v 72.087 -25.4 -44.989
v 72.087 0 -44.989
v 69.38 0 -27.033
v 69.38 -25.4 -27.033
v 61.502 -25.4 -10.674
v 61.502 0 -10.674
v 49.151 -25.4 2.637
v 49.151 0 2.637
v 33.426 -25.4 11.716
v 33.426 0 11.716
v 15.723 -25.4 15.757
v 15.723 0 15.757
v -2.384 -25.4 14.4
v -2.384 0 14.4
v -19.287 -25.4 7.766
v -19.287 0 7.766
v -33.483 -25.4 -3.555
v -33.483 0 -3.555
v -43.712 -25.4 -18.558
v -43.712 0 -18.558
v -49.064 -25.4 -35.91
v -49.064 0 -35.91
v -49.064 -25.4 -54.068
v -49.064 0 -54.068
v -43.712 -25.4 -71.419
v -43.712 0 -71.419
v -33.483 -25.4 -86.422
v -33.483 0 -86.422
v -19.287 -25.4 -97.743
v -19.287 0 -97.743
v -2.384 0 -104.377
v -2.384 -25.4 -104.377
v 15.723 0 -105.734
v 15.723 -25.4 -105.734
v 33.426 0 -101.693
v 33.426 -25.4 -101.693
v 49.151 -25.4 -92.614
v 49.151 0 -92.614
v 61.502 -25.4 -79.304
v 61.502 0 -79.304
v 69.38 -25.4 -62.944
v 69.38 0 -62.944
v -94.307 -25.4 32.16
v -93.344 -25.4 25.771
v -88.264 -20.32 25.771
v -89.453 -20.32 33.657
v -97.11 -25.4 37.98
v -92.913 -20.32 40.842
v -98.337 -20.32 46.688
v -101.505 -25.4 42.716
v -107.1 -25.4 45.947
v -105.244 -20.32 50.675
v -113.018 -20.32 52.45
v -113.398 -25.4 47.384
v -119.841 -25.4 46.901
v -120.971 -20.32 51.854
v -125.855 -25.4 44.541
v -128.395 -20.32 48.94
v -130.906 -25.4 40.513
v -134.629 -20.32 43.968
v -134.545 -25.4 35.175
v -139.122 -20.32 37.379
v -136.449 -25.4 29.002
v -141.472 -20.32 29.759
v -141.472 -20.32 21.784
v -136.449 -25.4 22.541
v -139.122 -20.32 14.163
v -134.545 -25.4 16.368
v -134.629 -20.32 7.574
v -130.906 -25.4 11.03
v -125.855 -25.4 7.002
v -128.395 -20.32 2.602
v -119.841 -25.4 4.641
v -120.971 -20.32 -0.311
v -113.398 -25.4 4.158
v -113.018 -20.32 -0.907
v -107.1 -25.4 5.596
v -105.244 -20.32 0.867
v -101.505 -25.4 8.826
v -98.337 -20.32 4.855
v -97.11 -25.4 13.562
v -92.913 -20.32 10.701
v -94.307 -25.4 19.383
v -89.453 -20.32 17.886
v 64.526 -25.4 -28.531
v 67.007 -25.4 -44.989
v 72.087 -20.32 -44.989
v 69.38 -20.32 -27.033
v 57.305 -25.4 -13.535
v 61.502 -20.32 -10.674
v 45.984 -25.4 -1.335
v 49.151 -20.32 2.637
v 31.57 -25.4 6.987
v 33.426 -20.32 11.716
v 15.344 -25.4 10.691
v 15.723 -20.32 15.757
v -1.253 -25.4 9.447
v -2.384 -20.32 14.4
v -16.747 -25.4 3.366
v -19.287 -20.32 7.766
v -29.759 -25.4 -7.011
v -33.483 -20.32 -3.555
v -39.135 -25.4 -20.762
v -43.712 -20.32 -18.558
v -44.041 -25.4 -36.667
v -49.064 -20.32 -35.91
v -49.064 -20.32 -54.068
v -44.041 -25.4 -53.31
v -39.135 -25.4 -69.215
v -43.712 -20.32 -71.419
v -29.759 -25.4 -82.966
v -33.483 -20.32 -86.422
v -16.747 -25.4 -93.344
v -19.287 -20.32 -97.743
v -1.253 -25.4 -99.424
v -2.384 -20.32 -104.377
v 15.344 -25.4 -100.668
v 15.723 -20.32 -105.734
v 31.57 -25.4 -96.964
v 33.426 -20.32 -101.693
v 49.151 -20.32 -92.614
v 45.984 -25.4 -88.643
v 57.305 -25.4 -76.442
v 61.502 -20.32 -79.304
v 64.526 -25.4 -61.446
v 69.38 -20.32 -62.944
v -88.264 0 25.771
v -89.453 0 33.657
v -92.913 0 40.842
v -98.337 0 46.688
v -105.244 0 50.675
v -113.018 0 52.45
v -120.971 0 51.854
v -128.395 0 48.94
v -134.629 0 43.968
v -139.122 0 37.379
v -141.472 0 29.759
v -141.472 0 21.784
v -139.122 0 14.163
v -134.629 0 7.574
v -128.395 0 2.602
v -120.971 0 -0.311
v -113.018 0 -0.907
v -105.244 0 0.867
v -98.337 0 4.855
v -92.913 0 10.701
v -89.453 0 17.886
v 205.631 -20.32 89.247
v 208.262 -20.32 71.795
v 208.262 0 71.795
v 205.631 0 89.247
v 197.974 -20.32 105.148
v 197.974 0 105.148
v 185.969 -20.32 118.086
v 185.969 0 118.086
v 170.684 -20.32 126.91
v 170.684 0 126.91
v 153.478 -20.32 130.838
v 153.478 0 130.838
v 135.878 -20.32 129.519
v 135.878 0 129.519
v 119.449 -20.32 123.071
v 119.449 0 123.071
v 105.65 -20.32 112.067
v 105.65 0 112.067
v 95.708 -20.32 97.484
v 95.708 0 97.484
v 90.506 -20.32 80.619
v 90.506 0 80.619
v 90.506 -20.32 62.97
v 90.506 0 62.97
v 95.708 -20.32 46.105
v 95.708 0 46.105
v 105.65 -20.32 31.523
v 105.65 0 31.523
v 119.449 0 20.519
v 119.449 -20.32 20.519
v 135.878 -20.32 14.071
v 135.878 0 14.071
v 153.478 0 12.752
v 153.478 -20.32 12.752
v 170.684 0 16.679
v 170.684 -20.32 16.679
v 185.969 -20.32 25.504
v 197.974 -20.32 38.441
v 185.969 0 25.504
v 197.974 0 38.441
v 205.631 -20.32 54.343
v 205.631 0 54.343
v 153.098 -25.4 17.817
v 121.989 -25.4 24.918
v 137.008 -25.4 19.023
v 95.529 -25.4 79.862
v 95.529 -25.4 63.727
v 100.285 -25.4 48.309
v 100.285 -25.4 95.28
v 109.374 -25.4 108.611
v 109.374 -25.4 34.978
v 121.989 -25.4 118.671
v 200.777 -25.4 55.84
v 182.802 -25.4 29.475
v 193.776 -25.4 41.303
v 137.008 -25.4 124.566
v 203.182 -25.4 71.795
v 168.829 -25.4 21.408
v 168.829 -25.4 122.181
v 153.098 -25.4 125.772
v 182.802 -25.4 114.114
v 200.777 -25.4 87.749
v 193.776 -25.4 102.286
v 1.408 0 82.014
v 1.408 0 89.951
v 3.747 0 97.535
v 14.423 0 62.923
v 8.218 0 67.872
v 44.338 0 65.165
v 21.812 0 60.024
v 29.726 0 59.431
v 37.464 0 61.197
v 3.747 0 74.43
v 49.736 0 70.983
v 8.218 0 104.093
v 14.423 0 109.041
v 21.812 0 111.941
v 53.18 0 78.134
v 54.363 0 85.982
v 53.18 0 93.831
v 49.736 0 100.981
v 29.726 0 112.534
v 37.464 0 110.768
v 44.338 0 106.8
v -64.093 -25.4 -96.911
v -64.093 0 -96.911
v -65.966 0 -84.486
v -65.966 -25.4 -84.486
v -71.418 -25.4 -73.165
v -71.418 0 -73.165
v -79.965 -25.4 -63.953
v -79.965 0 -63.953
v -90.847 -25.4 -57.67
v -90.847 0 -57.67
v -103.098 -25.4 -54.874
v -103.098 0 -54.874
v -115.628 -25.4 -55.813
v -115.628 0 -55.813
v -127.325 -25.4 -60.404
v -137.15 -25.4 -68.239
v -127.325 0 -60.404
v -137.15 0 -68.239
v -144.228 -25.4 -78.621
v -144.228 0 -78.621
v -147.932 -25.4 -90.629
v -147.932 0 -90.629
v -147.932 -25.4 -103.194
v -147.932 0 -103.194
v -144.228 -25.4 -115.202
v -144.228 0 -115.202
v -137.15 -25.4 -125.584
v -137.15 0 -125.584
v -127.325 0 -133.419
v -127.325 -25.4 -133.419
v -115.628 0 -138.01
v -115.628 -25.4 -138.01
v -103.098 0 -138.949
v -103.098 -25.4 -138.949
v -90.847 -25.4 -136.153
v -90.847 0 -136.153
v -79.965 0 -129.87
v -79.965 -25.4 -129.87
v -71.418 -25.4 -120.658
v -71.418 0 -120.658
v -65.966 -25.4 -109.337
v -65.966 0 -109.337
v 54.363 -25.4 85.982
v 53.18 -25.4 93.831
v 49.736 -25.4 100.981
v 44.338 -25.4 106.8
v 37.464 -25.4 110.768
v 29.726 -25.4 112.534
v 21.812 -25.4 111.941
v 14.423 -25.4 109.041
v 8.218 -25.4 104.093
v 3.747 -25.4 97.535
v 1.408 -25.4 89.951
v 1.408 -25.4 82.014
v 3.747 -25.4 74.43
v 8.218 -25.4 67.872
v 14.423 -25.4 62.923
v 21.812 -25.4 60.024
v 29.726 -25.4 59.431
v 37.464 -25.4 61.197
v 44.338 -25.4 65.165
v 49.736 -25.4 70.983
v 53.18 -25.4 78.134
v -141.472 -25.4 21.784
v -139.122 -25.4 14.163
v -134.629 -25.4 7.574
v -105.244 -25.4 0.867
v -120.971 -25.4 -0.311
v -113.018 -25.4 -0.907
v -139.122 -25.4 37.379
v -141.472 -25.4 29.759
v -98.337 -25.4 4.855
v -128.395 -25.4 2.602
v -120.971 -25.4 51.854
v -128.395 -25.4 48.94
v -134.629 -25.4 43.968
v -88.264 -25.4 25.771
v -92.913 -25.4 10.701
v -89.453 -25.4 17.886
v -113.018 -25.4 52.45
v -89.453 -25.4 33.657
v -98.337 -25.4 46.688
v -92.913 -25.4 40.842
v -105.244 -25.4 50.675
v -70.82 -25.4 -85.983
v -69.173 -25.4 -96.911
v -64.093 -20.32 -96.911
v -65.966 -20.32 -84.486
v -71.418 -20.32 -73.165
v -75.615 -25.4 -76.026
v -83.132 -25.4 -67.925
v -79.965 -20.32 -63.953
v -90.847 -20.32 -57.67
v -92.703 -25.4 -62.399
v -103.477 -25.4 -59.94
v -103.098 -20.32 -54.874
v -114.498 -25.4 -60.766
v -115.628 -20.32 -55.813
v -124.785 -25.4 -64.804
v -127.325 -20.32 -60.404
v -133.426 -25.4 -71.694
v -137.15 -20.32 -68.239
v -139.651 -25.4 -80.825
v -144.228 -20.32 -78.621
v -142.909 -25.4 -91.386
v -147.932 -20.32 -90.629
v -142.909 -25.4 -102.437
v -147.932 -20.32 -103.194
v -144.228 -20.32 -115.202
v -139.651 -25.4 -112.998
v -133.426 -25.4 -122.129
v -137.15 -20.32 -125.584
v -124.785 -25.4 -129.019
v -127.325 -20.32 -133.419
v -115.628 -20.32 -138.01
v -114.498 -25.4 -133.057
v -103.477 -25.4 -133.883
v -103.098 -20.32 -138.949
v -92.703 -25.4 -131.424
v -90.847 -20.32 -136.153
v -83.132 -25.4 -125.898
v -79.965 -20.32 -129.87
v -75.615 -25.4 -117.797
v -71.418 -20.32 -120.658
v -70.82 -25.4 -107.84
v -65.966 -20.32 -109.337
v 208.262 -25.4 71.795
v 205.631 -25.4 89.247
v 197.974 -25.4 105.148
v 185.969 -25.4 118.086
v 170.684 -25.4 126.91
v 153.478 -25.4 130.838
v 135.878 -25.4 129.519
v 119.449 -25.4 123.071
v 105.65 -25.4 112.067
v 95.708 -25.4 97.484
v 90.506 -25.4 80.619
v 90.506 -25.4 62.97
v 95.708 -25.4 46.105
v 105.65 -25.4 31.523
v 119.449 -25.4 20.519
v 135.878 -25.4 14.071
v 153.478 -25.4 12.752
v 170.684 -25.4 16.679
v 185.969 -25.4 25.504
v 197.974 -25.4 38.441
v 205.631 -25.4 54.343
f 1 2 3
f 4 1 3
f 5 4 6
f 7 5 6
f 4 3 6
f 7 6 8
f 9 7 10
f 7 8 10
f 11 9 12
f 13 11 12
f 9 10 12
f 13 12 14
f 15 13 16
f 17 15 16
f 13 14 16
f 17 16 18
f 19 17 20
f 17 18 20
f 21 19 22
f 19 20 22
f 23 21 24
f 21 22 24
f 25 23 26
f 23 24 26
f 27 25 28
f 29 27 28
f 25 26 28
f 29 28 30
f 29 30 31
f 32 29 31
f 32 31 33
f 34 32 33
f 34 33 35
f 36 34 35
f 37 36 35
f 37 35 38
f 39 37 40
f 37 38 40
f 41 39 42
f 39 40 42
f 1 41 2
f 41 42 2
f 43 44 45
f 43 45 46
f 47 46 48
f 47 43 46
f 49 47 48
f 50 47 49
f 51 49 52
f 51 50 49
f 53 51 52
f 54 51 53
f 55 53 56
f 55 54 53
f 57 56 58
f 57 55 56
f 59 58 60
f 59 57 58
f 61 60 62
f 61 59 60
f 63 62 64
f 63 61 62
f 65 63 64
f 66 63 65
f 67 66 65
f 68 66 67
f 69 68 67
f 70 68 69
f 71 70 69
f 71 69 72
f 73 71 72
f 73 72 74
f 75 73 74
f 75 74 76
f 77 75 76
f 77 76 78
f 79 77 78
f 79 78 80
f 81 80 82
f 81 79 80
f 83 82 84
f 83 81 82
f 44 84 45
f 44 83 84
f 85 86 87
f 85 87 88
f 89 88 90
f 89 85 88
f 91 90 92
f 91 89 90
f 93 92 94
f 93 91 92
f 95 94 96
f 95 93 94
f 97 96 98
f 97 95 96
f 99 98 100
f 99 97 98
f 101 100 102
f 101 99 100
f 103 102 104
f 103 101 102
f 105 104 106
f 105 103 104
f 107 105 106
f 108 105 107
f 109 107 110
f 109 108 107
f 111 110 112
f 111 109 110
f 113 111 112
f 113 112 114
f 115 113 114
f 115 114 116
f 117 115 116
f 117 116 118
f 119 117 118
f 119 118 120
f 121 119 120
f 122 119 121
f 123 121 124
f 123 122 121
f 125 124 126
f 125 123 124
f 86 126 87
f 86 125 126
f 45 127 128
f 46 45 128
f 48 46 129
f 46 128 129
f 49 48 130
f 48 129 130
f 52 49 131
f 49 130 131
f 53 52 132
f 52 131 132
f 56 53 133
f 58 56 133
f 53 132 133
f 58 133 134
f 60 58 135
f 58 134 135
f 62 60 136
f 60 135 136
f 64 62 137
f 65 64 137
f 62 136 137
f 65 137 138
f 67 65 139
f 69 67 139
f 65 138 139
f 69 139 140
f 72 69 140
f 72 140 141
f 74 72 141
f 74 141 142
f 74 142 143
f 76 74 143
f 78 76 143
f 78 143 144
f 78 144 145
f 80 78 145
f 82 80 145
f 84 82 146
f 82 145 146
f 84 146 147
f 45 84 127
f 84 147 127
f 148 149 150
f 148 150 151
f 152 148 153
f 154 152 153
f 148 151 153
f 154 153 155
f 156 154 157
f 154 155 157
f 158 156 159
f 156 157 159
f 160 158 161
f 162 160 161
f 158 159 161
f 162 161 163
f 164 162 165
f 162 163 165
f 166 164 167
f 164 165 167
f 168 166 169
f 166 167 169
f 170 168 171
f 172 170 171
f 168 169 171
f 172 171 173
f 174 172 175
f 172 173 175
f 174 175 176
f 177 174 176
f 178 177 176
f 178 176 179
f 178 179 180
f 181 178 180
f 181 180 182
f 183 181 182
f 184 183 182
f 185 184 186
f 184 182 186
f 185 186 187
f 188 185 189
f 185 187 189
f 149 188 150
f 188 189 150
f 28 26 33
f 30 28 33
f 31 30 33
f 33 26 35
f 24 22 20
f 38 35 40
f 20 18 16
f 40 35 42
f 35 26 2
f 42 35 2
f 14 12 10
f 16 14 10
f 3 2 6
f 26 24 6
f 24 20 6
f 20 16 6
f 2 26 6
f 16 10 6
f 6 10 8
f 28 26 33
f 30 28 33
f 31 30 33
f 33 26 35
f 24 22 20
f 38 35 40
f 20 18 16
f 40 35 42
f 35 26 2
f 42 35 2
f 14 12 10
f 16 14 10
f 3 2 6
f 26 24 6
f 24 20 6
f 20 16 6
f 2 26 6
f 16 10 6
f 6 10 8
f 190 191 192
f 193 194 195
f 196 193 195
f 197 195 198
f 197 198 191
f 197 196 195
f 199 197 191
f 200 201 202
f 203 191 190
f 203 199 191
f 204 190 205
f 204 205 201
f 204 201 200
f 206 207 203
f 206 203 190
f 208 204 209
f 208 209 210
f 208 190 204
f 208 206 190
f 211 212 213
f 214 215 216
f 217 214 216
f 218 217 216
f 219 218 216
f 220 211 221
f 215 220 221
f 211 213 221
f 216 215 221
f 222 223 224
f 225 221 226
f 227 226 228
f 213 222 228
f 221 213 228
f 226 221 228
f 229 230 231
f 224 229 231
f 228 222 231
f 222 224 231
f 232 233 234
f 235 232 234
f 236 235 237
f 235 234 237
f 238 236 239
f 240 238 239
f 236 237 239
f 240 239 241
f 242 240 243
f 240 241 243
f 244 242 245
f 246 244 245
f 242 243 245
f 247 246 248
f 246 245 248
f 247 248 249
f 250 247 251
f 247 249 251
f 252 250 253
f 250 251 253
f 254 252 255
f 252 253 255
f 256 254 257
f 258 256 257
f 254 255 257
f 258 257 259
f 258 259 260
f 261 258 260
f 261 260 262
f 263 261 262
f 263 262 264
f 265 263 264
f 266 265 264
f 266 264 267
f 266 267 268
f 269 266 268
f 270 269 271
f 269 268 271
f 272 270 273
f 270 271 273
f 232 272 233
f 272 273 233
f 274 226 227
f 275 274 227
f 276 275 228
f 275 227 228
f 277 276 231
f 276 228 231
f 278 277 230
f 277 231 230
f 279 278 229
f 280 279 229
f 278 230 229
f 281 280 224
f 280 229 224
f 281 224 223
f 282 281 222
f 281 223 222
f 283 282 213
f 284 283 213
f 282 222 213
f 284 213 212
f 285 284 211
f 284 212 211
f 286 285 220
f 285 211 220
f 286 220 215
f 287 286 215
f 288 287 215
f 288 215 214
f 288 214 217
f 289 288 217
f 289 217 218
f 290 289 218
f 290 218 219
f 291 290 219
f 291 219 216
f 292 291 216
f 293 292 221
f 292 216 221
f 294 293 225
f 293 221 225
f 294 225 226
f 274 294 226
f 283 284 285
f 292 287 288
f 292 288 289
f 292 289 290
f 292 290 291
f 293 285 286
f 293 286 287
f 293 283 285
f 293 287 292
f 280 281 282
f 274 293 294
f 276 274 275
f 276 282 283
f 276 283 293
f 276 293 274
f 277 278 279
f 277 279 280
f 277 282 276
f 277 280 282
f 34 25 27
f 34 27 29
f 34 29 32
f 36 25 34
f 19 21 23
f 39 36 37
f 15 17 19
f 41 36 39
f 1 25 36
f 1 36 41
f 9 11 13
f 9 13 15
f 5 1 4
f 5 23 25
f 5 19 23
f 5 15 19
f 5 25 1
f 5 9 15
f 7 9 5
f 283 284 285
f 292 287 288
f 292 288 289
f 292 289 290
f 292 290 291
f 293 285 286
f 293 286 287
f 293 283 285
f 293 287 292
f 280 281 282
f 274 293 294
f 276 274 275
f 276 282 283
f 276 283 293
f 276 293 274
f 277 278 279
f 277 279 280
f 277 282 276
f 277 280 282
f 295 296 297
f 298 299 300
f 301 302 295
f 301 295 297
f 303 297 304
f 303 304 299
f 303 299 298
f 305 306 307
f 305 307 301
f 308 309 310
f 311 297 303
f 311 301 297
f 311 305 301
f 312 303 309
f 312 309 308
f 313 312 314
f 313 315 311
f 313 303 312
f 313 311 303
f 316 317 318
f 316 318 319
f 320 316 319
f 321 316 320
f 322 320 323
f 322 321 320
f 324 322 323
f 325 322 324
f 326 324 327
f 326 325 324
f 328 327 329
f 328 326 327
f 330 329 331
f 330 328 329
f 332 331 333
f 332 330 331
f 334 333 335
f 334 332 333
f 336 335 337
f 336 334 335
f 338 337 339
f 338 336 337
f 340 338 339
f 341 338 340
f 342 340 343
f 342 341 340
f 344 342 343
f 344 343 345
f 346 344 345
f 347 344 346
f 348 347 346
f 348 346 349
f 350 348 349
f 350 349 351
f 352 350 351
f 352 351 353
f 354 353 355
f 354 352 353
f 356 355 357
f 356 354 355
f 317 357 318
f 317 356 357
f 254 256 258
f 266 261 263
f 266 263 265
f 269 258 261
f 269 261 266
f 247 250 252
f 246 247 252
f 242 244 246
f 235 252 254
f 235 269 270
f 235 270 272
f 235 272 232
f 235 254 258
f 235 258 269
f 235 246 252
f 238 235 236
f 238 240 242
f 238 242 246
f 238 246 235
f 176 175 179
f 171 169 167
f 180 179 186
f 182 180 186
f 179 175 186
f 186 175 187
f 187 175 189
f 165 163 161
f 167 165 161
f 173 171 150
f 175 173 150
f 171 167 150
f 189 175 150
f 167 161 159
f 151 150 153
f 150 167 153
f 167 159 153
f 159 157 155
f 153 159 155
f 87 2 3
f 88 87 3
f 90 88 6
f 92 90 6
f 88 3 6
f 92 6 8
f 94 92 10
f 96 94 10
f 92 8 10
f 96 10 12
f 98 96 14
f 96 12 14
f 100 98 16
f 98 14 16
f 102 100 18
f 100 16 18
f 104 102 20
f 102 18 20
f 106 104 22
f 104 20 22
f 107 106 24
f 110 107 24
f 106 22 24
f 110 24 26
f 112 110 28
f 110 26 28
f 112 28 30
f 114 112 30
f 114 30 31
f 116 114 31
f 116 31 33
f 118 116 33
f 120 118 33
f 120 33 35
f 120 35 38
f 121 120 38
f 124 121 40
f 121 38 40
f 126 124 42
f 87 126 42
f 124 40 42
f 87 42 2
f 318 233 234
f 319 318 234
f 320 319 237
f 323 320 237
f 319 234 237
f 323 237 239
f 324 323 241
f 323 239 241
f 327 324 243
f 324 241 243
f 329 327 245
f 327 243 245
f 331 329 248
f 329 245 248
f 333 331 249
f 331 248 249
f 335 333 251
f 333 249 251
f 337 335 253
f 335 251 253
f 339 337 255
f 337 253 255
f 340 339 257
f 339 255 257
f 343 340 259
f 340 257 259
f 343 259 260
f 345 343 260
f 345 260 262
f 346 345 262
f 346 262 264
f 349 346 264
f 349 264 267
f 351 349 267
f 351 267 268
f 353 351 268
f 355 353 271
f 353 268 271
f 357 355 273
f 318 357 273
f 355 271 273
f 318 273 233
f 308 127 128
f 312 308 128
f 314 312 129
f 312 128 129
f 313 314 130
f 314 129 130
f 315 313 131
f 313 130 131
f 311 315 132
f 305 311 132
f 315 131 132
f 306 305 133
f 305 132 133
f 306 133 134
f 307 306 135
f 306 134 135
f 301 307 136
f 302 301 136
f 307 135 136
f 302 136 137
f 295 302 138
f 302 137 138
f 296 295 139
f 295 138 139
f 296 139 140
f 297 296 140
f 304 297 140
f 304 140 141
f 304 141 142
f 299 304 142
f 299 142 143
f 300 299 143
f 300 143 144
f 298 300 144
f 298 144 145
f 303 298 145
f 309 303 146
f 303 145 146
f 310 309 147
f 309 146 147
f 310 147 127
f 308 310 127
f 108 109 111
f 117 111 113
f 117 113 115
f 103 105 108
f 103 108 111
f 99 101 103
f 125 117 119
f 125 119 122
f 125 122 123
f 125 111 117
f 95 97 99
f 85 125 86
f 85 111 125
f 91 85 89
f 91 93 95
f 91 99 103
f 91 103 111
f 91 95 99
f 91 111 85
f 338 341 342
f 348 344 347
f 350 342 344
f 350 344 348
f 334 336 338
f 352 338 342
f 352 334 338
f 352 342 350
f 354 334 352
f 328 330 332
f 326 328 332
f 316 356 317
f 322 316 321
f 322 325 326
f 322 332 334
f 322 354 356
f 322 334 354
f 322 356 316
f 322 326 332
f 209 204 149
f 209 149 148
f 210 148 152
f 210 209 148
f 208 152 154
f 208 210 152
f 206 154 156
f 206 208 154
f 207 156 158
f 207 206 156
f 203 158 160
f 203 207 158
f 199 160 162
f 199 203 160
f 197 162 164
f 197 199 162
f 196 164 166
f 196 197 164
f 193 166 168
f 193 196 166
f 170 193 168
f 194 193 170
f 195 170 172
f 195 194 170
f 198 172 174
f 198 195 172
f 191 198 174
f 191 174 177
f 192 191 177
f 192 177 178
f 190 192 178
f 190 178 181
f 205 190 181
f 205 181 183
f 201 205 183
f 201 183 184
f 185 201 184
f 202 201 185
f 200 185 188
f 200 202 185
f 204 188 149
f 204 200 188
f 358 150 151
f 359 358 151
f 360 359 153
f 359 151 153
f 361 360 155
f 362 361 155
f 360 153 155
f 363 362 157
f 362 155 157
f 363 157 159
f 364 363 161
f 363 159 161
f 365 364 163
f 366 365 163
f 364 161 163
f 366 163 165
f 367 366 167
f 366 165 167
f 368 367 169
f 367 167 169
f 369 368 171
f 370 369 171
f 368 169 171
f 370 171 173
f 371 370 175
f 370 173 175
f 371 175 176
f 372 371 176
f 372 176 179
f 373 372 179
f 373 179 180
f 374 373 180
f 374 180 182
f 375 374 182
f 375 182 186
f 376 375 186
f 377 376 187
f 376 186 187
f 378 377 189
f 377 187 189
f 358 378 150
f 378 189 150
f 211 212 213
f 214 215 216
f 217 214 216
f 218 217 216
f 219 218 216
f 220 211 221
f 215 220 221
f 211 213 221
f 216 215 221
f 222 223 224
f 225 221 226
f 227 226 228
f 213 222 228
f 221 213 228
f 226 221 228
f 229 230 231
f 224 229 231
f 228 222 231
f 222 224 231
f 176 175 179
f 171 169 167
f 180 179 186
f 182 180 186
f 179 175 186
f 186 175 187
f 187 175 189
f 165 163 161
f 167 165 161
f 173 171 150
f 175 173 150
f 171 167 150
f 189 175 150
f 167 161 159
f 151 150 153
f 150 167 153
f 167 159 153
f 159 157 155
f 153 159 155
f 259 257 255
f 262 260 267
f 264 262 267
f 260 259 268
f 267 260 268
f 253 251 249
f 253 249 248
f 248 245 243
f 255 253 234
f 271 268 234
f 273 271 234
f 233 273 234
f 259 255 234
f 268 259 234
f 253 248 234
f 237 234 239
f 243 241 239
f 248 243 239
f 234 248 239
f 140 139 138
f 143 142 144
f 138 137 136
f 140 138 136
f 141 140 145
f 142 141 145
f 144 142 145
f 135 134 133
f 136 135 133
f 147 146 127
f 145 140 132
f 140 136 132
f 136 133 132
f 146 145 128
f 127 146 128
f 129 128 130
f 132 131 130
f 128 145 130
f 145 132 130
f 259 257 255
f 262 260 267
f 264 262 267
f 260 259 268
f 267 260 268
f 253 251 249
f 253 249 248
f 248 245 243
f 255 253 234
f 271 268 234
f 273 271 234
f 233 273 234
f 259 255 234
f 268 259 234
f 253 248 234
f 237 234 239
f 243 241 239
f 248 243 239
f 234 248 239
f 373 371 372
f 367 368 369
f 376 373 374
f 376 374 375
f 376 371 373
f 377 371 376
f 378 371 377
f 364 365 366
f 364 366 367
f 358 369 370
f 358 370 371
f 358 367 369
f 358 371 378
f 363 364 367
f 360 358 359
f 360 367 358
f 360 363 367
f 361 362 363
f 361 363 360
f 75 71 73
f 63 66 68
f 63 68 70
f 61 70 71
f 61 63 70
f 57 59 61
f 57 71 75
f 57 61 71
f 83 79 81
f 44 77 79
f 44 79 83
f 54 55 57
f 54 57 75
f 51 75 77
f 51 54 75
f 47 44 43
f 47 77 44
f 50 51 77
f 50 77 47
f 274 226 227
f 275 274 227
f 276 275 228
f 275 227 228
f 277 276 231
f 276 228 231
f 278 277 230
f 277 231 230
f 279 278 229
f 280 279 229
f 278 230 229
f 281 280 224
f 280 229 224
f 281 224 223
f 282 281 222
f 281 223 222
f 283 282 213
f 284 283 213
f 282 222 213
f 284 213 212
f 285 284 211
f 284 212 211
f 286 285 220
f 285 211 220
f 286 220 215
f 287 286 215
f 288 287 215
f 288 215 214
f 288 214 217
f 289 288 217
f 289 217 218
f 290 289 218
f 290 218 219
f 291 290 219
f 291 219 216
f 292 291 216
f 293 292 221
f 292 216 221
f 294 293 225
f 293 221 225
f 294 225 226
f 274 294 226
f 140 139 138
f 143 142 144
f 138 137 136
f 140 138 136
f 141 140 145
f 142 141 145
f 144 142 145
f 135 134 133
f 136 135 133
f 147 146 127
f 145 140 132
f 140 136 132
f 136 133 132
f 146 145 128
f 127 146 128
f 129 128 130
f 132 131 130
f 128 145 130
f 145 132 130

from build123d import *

# Parameters (mm, degrees)
F0_R     = 26.753461
F0_R_2   = 42.155045
F0_R_3   = 60.915573
F0_R_4   = 59.20854
F0_R_5   = 26.626221
F1_DEPTH = 25.4
F2_DEPTH = 25.4
F3_SIZE  = 5.08


with BuildPart() as f1:
    # F0 (on Front) → F1 (new body)
    with BuildSketch(Plane.XZ):
        with Locations((-115.017772, 25.771314)):
            Circle(F0_R)
        with Locations((-106.247902, -96.911483)):
            Circle(F0_R_2)
        with Locations((11.171089, -44.98855)):
            Circle(F0_R_3)
        with Locations((149.053141, 71.794651)):
            Circle(F0_R_4)
        with Locations((27.736424, 85.982323)):
            Circle(F0_R_5)
    extrude(amount=F1_DEPTH)

    # F3
    f3_edges = [f1.edges().sort_by_distance(p)[0] for p in [
        (-141.771233, -25.4, 25.771314),
        (-148.402947, -25.4, -96.911483),
        (-49.744483, -25.4, -44.98855),
        (89.844602, -25.4, 71.794651),
    ]]
    chamfer(f3_edges, length=F3_SIZE)


with BuildPart() as f2:
    # F0 (on Front) → F2 (new body)
    with BuildSketch(Plane.XZ):
        with Locations((-115.017772, 25.771314)):
            Circle(F0_R)
        with Locations((-106.247902, -96.911483)):
            Circle(F0_R_2)
        with Locations((11.171089, -44.98855)):
            Circle(F0_R_3)
        with Locations((149.053141, 71.794651)):
            Circle(F0_R_4)
        with Locations((27.736424, 85.982323)):
            Circle(F0_R_5)
    extrude(amount=F2_DEPTH)


solid = Compound([f1.part, f2.part])
